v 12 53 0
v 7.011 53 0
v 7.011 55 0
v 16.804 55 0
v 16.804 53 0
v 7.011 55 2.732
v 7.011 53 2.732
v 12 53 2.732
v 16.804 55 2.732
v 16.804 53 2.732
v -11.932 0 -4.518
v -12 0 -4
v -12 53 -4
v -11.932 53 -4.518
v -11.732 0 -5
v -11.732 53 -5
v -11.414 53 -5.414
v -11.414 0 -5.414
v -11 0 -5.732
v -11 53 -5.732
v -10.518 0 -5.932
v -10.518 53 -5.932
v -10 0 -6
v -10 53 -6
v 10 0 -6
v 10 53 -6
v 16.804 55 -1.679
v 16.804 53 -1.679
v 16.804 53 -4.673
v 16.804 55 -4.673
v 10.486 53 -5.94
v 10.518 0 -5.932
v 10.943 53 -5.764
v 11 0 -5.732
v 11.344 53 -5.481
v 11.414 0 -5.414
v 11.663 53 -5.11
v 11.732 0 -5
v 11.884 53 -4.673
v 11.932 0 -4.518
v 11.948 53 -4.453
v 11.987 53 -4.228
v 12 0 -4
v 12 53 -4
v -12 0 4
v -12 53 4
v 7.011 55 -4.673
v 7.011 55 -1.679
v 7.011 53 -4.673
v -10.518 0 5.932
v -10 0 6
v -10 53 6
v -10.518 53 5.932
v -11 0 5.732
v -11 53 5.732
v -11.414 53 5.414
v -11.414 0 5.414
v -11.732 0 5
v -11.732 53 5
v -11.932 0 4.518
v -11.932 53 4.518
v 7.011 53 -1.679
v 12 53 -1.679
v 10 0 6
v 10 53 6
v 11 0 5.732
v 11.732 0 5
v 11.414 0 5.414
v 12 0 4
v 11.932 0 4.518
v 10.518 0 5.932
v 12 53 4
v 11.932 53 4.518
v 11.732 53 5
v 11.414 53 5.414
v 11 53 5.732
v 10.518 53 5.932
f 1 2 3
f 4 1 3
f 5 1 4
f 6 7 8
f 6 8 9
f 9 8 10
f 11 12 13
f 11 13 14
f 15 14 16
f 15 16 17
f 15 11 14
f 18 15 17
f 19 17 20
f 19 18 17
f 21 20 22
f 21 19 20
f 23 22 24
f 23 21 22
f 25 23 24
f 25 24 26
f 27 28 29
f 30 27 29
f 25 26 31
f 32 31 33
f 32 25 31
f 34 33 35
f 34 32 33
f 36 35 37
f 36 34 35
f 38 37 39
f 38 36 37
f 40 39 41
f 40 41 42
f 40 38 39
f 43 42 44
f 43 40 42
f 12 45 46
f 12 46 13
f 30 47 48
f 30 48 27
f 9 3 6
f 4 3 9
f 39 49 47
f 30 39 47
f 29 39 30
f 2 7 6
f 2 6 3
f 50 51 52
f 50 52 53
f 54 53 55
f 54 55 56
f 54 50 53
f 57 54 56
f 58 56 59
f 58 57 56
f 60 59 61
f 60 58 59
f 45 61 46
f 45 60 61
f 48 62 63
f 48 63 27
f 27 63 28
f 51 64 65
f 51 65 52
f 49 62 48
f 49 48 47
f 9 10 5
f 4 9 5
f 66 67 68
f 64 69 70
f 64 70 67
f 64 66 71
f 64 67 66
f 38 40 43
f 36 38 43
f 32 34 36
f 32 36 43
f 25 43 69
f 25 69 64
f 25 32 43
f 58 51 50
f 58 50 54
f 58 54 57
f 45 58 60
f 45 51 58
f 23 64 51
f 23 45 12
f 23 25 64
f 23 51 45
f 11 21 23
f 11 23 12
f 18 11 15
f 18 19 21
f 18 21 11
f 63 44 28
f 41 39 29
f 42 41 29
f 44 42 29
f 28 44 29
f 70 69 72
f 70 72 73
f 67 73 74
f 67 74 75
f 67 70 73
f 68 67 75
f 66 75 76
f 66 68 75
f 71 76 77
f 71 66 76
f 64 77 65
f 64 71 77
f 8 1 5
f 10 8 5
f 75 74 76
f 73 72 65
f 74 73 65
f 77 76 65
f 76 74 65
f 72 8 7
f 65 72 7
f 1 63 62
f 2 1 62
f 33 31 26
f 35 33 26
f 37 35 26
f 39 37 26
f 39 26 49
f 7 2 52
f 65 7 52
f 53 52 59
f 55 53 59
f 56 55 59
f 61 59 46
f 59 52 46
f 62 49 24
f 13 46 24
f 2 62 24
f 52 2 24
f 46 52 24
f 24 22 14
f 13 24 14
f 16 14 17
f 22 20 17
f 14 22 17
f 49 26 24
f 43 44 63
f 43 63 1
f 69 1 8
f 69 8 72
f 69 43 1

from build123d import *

# Parameters (mm, degrees)
BOSS_EXTRUDE1_DEPTH = 53
SKETCH2_W           = 9.792899242
SKETCH2_H           = 2.993116411
SKETCH2_H_2         = 2.732466193
BOSS_EXTRUDE2_DEPTH = 2


with BuildPart() as part:
    # Sketch1 → Boss-Extrude1 (new body)
    with BuildSketch(Plane(origin=(0, 0, 0), x_dir=(1, 0, 0), z_dir=(0, 1, 0))):
        with BuildLine():
            Line((-10, 6), (10, 6))
            ThreePointArc((10, 6), (11.414213562, 5.414213562), (12, 4))
            Line((12, 4), (12, -4))
            ThreePointArc((12, -4), (11.414213562, -5.414213562), (10, -6))
            Line((10, -6), (-10, -6))
            ThreePointArc((-10, -6), (-11.414213562, -5.414213562), (-12, -4))
            Line((-12, -4), (-12, 4))
            ThreePointArc((-12, 4), (-11.414213562, 5.414213562), (-10, 6))
        make_face()
    extrude(amount=BOSS_EXTRUDE1_DEPTH)

    # Sketch2 → Boss-Extrude2 (add)
    with BuildSketch(Plane(origin=(0, 53, 0), x_dir=(1, 0, 0), z_dir=(0, 1, 0))):
        with Locations((11.907689601, 3.176051955)):
            Rectangle(SKETCH2_W, SKETCH2_H)
        with Locations((11.907689601, -1.366233097)):
            Rectangle(SKETCH2_W, SKETCH2_H_2)
    extrude(amount=BOSS_EXTRUDE2_DEPTH)


solid = part.part
